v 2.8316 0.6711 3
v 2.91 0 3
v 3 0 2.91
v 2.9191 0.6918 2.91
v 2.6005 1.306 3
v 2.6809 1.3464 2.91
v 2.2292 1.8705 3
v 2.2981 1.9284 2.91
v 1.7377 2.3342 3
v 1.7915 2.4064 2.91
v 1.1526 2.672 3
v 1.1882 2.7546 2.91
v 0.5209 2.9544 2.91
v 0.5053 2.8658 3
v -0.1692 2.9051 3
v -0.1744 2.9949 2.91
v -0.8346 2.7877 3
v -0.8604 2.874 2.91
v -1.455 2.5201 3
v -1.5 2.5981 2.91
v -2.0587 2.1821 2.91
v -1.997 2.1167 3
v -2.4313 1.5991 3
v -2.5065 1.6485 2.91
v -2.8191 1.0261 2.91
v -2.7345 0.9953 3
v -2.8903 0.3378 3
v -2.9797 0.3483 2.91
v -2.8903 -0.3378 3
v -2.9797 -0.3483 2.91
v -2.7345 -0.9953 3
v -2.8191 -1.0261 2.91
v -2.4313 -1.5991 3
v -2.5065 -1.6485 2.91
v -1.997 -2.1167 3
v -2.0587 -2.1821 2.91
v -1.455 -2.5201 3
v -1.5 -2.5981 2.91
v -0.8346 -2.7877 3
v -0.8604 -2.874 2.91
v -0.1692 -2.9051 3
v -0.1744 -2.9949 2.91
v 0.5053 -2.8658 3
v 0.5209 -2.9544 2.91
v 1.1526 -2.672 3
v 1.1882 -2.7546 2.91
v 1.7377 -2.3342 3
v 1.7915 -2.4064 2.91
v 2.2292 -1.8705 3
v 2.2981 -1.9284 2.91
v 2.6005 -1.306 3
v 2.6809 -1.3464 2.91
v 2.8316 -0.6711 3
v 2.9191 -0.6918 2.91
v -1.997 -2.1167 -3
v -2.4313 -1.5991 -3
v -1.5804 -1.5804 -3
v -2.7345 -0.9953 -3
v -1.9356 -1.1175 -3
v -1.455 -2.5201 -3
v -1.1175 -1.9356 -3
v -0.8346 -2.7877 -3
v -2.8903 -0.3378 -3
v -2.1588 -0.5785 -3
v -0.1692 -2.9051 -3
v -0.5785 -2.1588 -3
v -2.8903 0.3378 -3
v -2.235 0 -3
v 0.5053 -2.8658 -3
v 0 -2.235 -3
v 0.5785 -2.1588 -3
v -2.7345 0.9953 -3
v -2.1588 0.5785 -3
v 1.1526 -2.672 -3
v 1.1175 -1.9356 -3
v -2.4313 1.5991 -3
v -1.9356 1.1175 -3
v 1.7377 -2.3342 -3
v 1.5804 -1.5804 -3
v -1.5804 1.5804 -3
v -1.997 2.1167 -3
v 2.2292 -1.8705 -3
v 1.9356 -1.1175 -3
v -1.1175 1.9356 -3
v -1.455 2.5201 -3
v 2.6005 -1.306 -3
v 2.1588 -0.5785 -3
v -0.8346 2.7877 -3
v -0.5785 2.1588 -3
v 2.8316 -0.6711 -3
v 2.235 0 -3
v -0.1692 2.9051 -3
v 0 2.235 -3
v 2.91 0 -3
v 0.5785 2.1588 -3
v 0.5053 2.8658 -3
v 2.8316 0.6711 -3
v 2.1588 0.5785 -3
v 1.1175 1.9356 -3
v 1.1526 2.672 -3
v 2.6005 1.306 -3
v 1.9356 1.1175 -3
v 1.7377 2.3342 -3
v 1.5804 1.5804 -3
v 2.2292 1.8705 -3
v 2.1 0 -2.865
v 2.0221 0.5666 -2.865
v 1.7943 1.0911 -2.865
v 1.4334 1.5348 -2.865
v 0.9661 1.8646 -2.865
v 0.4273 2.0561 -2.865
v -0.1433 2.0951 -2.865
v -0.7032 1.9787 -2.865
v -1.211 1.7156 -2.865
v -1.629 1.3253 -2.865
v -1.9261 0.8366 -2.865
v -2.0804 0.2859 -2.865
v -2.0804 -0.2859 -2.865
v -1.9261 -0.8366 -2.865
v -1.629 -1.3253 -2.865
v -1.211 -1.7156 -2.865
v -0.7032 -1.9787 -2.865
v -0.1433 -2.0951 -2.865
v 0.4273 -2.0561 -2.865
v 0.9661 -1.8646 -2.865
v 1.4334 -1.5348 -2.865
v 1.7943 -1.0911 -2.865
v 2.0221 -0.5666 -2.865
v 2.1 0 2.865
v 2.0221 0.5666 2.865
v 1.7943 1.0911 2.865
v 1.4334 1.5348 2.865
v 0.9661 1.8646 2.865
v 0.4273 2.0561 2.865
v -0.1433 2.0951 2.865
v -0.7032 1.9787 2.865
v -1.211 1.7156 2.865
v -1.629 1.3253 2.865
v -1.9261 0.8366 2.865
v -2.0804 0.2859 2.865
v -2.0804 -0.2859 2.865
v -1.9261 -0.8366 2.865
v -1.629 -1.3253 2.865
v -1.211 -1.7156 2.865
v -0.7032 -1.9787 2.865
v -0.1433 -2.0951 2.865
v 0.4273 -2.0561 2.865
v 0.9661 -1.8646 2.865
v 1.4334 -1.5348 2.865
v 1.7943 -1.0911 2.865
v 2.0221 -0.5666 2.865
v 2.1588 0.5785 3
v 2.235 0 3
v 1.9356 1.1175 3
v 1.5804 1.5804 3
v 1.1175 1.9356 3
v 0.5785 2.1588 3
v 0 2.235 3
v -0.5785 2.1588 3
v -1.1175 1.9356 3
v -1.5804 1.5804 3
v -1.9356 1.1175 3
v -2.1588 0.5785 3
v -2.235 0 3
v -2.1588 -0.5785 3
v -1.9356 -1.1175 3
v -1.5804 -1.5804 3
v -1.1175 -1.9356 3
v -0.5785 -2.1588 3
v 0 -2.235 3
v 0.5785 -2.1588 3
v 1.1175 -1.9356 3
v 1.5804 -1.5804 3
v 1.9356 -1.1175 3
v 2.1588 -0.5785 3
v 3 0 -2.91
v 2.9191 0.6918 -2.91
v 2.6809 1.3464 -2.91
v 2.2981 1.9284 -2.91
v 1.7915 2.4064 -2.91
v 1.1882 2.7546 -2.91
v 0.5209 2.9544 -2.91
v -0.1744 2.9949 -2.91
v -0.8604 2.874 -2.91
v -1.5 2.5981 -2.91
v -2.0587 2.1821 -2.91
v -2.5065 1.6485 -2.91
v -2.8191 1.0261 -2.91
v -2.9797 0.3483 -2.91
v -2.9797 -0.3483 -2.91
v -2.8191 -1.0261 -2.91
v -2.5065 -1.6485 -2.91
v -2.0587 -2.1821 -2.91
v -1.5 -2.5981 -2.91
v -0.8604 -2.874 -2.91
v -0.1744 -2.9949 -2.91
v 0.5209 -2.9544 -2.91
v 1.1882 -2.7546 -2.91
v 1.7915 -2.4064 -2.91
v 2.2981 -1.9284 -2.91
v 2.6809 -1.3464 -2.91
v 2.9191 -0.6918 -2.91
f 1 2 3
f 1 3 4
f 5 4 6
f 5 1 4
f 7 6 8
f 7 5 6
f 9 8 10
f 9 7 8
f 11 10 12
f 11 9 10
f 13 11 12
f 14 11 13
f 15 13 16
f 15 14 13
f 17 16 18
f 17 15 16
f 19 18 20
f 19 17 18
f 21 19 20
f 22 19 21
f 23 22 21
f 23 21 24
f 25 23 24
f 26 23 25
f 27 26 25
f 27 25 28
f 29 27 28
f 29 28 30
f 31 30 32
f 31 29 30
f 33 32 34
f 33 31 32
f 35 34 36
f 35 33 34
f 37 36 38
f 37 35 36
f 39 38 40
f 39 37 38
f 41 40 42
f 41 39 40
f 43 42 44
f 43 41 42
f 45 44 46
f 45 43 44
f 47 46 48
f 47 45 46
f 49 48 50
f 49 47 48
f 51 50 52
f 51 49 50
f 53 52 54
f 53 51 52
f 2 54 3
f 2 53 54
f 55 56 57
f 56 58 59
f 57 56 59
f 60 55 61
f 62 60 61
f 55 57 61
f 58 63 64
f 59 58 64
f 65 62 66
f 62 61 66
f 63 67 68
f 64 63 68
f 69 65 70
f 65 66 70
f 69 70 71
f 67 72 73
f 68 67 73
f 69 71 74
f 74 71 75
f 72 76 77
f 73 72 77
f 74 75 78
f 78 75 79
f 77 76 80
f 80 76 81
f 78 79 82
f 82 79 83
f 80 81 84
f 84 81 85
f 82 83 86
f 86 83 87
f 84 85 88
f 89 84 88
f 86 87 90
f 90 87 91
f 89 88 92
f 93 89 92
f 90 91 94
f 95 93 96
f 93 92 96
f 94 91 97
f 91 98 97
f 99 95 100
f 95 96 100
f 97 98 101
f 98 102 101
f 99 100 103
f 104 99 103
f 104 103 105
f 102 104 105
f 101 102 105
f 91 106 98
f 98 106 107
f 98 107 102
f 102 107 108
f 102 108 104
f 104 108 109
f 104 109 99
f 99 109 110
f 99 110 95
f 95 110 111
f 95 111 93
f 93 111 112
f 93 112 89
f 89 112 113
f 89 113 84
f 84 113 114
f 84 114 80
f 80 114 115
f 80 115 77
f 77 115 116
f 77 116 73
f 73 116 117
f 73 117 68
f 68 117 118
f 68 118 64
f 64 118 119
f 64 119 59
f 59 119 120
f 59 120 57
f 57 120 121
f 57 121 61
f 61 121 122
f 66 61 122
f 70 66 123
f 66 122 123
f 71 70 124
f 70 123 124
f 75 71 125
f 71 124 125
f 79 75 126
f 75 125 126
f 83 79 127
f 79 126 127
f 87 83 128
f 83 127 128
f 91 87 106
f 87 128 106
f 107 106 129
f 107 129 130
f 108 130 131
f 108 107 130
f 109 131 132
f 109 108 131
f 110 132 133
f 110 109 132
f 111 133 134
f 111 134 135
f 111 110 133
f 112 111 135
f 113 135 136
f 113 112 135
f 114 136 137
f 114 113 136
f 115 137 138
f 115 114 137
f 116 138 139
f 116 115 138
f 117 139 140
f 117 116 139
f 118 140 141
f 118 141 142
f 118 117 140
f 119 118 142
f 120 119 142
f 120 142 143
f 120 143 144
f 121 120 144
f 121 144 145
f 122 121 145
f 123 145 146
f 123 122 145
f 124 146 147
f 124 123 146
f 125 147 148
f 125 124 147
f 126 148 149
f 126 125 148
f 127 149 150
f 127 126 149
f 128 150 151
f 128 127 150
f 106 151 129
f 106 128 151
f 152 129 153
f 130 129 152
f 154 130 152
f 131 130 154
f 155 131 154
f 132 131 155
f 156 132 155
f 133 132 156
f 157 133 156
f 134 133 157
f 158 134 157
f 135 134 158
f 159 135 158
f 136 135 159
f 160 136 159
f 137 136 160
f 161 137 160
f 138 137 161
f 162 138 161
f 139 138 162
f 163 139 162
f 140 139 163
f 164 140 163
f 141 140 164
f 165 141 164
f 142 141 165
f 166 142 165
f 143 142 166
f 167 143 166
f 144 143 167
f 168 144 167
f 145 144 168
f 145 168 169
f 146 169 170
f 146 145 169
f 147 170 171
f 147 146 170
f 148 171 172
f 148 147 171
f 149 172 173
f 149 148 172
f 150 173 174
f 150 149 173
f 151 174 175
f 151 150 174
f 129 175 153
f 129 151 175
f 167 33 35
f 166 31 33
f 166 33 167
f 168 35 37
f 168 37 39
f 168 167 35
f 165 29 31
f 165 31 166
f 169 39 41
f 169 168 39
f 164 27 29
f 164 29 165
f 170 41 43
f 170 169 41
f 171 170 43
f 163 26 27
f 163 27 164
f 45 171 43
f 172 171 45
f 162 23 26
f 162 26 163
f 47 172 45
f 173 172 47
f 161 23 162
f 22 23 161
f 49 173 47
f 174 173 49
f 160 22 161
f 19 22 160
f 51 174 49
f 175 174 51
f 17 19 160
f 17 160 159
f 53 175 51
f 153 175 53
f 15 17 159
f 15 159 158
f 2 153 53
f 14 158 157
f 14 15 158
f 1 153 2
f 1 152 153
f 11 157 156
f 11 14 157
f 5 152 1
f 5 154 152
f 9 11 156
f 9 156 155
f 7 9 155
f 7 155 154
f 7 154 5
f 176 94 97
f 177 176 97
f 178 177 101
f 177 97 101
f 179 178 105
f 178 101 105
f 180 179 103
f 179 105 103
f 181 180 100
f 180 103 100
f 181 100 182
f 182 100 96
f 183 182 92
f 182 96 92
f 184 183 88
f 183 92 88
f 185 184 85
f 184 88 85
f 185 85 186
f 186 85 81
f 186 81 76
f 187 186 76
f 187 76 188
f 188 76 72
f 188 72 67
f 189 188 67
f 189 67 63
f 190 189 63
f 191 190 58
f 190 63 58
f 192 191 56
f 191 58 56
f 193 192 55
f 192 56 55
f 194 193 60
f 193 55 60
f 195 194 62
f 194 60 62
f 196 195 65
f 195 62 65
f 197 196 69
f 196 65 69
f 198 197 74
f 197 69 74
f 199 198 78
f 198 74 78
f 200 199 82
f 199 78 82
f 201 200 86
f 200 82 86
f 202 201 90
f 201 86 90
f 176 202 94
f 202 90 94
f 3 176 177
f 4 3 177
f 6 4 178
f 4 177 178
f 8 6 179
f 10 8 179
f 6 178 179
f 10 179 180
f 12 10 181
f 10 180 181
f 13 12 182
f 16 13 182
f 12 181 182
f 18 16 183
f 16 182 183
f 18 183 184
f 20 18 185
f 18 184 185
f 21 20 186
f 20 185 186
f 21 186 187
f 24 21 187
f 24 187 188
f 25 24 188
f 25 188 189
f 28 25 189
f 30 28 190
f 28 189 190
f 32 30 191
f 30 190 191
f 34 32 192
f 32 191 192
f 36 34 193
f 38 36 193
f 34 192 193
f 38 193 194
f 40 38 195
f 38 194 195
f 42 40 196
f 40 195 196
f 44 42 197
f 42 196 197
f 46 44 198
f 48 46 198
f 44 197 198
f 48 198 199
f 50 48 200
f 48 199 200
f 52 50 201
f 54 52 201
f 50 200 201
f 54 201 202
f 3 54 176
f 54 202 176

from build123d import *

# Parameters (mm, degrees)
BOSS_EXTRUDE1_DEPTH      = 3
BOSS_EXTRUDE1_DEPTH_BACK = 3
SKETCH3_R                = 3
SKETCH3_R_2              = 2.1
CHAMFER1_SIZE            = 0.09
CHAMFER2_SIZE            = 0.135


with BuildPart() as part:
    # Sketch3 → Boss-Extrude1 (new, two sides: drawn at the far end of the back side and taken through both)
    with BuildSketch(Plane.XY.offset(-BOSS_EXTRUDE1_DEPTH_BACK)):
        Circle(SKETCH3_R)
        Circle(SKETCH3_R_2, mode=Mode.SUBTRACT)
    extrude(amount=BOSS_EXTRUDE1_DEPTH + BOSS_EXTRUDE1_DEPTH_BACK)

    # Chamfer1
    chamfer1_edges = [part.edges().sort_by_distance(p)[0] for p in [
        (-3, 0, -3),
        (-3, 0, 3),
    ]]
    chamfer(chamfer1_edges, length=CHAMFER1_SIZE)

    # Chamfer2
    chamfer2_edges = [part.edges().sort_by_distance(p)[0] for p in [
        (-2.1, 0, -3),
        (-2.1, 0, 3),
    ]]
    chamfer(chamfer2_edges, length=CHAMFER2_SIZE)


solid = part.part
